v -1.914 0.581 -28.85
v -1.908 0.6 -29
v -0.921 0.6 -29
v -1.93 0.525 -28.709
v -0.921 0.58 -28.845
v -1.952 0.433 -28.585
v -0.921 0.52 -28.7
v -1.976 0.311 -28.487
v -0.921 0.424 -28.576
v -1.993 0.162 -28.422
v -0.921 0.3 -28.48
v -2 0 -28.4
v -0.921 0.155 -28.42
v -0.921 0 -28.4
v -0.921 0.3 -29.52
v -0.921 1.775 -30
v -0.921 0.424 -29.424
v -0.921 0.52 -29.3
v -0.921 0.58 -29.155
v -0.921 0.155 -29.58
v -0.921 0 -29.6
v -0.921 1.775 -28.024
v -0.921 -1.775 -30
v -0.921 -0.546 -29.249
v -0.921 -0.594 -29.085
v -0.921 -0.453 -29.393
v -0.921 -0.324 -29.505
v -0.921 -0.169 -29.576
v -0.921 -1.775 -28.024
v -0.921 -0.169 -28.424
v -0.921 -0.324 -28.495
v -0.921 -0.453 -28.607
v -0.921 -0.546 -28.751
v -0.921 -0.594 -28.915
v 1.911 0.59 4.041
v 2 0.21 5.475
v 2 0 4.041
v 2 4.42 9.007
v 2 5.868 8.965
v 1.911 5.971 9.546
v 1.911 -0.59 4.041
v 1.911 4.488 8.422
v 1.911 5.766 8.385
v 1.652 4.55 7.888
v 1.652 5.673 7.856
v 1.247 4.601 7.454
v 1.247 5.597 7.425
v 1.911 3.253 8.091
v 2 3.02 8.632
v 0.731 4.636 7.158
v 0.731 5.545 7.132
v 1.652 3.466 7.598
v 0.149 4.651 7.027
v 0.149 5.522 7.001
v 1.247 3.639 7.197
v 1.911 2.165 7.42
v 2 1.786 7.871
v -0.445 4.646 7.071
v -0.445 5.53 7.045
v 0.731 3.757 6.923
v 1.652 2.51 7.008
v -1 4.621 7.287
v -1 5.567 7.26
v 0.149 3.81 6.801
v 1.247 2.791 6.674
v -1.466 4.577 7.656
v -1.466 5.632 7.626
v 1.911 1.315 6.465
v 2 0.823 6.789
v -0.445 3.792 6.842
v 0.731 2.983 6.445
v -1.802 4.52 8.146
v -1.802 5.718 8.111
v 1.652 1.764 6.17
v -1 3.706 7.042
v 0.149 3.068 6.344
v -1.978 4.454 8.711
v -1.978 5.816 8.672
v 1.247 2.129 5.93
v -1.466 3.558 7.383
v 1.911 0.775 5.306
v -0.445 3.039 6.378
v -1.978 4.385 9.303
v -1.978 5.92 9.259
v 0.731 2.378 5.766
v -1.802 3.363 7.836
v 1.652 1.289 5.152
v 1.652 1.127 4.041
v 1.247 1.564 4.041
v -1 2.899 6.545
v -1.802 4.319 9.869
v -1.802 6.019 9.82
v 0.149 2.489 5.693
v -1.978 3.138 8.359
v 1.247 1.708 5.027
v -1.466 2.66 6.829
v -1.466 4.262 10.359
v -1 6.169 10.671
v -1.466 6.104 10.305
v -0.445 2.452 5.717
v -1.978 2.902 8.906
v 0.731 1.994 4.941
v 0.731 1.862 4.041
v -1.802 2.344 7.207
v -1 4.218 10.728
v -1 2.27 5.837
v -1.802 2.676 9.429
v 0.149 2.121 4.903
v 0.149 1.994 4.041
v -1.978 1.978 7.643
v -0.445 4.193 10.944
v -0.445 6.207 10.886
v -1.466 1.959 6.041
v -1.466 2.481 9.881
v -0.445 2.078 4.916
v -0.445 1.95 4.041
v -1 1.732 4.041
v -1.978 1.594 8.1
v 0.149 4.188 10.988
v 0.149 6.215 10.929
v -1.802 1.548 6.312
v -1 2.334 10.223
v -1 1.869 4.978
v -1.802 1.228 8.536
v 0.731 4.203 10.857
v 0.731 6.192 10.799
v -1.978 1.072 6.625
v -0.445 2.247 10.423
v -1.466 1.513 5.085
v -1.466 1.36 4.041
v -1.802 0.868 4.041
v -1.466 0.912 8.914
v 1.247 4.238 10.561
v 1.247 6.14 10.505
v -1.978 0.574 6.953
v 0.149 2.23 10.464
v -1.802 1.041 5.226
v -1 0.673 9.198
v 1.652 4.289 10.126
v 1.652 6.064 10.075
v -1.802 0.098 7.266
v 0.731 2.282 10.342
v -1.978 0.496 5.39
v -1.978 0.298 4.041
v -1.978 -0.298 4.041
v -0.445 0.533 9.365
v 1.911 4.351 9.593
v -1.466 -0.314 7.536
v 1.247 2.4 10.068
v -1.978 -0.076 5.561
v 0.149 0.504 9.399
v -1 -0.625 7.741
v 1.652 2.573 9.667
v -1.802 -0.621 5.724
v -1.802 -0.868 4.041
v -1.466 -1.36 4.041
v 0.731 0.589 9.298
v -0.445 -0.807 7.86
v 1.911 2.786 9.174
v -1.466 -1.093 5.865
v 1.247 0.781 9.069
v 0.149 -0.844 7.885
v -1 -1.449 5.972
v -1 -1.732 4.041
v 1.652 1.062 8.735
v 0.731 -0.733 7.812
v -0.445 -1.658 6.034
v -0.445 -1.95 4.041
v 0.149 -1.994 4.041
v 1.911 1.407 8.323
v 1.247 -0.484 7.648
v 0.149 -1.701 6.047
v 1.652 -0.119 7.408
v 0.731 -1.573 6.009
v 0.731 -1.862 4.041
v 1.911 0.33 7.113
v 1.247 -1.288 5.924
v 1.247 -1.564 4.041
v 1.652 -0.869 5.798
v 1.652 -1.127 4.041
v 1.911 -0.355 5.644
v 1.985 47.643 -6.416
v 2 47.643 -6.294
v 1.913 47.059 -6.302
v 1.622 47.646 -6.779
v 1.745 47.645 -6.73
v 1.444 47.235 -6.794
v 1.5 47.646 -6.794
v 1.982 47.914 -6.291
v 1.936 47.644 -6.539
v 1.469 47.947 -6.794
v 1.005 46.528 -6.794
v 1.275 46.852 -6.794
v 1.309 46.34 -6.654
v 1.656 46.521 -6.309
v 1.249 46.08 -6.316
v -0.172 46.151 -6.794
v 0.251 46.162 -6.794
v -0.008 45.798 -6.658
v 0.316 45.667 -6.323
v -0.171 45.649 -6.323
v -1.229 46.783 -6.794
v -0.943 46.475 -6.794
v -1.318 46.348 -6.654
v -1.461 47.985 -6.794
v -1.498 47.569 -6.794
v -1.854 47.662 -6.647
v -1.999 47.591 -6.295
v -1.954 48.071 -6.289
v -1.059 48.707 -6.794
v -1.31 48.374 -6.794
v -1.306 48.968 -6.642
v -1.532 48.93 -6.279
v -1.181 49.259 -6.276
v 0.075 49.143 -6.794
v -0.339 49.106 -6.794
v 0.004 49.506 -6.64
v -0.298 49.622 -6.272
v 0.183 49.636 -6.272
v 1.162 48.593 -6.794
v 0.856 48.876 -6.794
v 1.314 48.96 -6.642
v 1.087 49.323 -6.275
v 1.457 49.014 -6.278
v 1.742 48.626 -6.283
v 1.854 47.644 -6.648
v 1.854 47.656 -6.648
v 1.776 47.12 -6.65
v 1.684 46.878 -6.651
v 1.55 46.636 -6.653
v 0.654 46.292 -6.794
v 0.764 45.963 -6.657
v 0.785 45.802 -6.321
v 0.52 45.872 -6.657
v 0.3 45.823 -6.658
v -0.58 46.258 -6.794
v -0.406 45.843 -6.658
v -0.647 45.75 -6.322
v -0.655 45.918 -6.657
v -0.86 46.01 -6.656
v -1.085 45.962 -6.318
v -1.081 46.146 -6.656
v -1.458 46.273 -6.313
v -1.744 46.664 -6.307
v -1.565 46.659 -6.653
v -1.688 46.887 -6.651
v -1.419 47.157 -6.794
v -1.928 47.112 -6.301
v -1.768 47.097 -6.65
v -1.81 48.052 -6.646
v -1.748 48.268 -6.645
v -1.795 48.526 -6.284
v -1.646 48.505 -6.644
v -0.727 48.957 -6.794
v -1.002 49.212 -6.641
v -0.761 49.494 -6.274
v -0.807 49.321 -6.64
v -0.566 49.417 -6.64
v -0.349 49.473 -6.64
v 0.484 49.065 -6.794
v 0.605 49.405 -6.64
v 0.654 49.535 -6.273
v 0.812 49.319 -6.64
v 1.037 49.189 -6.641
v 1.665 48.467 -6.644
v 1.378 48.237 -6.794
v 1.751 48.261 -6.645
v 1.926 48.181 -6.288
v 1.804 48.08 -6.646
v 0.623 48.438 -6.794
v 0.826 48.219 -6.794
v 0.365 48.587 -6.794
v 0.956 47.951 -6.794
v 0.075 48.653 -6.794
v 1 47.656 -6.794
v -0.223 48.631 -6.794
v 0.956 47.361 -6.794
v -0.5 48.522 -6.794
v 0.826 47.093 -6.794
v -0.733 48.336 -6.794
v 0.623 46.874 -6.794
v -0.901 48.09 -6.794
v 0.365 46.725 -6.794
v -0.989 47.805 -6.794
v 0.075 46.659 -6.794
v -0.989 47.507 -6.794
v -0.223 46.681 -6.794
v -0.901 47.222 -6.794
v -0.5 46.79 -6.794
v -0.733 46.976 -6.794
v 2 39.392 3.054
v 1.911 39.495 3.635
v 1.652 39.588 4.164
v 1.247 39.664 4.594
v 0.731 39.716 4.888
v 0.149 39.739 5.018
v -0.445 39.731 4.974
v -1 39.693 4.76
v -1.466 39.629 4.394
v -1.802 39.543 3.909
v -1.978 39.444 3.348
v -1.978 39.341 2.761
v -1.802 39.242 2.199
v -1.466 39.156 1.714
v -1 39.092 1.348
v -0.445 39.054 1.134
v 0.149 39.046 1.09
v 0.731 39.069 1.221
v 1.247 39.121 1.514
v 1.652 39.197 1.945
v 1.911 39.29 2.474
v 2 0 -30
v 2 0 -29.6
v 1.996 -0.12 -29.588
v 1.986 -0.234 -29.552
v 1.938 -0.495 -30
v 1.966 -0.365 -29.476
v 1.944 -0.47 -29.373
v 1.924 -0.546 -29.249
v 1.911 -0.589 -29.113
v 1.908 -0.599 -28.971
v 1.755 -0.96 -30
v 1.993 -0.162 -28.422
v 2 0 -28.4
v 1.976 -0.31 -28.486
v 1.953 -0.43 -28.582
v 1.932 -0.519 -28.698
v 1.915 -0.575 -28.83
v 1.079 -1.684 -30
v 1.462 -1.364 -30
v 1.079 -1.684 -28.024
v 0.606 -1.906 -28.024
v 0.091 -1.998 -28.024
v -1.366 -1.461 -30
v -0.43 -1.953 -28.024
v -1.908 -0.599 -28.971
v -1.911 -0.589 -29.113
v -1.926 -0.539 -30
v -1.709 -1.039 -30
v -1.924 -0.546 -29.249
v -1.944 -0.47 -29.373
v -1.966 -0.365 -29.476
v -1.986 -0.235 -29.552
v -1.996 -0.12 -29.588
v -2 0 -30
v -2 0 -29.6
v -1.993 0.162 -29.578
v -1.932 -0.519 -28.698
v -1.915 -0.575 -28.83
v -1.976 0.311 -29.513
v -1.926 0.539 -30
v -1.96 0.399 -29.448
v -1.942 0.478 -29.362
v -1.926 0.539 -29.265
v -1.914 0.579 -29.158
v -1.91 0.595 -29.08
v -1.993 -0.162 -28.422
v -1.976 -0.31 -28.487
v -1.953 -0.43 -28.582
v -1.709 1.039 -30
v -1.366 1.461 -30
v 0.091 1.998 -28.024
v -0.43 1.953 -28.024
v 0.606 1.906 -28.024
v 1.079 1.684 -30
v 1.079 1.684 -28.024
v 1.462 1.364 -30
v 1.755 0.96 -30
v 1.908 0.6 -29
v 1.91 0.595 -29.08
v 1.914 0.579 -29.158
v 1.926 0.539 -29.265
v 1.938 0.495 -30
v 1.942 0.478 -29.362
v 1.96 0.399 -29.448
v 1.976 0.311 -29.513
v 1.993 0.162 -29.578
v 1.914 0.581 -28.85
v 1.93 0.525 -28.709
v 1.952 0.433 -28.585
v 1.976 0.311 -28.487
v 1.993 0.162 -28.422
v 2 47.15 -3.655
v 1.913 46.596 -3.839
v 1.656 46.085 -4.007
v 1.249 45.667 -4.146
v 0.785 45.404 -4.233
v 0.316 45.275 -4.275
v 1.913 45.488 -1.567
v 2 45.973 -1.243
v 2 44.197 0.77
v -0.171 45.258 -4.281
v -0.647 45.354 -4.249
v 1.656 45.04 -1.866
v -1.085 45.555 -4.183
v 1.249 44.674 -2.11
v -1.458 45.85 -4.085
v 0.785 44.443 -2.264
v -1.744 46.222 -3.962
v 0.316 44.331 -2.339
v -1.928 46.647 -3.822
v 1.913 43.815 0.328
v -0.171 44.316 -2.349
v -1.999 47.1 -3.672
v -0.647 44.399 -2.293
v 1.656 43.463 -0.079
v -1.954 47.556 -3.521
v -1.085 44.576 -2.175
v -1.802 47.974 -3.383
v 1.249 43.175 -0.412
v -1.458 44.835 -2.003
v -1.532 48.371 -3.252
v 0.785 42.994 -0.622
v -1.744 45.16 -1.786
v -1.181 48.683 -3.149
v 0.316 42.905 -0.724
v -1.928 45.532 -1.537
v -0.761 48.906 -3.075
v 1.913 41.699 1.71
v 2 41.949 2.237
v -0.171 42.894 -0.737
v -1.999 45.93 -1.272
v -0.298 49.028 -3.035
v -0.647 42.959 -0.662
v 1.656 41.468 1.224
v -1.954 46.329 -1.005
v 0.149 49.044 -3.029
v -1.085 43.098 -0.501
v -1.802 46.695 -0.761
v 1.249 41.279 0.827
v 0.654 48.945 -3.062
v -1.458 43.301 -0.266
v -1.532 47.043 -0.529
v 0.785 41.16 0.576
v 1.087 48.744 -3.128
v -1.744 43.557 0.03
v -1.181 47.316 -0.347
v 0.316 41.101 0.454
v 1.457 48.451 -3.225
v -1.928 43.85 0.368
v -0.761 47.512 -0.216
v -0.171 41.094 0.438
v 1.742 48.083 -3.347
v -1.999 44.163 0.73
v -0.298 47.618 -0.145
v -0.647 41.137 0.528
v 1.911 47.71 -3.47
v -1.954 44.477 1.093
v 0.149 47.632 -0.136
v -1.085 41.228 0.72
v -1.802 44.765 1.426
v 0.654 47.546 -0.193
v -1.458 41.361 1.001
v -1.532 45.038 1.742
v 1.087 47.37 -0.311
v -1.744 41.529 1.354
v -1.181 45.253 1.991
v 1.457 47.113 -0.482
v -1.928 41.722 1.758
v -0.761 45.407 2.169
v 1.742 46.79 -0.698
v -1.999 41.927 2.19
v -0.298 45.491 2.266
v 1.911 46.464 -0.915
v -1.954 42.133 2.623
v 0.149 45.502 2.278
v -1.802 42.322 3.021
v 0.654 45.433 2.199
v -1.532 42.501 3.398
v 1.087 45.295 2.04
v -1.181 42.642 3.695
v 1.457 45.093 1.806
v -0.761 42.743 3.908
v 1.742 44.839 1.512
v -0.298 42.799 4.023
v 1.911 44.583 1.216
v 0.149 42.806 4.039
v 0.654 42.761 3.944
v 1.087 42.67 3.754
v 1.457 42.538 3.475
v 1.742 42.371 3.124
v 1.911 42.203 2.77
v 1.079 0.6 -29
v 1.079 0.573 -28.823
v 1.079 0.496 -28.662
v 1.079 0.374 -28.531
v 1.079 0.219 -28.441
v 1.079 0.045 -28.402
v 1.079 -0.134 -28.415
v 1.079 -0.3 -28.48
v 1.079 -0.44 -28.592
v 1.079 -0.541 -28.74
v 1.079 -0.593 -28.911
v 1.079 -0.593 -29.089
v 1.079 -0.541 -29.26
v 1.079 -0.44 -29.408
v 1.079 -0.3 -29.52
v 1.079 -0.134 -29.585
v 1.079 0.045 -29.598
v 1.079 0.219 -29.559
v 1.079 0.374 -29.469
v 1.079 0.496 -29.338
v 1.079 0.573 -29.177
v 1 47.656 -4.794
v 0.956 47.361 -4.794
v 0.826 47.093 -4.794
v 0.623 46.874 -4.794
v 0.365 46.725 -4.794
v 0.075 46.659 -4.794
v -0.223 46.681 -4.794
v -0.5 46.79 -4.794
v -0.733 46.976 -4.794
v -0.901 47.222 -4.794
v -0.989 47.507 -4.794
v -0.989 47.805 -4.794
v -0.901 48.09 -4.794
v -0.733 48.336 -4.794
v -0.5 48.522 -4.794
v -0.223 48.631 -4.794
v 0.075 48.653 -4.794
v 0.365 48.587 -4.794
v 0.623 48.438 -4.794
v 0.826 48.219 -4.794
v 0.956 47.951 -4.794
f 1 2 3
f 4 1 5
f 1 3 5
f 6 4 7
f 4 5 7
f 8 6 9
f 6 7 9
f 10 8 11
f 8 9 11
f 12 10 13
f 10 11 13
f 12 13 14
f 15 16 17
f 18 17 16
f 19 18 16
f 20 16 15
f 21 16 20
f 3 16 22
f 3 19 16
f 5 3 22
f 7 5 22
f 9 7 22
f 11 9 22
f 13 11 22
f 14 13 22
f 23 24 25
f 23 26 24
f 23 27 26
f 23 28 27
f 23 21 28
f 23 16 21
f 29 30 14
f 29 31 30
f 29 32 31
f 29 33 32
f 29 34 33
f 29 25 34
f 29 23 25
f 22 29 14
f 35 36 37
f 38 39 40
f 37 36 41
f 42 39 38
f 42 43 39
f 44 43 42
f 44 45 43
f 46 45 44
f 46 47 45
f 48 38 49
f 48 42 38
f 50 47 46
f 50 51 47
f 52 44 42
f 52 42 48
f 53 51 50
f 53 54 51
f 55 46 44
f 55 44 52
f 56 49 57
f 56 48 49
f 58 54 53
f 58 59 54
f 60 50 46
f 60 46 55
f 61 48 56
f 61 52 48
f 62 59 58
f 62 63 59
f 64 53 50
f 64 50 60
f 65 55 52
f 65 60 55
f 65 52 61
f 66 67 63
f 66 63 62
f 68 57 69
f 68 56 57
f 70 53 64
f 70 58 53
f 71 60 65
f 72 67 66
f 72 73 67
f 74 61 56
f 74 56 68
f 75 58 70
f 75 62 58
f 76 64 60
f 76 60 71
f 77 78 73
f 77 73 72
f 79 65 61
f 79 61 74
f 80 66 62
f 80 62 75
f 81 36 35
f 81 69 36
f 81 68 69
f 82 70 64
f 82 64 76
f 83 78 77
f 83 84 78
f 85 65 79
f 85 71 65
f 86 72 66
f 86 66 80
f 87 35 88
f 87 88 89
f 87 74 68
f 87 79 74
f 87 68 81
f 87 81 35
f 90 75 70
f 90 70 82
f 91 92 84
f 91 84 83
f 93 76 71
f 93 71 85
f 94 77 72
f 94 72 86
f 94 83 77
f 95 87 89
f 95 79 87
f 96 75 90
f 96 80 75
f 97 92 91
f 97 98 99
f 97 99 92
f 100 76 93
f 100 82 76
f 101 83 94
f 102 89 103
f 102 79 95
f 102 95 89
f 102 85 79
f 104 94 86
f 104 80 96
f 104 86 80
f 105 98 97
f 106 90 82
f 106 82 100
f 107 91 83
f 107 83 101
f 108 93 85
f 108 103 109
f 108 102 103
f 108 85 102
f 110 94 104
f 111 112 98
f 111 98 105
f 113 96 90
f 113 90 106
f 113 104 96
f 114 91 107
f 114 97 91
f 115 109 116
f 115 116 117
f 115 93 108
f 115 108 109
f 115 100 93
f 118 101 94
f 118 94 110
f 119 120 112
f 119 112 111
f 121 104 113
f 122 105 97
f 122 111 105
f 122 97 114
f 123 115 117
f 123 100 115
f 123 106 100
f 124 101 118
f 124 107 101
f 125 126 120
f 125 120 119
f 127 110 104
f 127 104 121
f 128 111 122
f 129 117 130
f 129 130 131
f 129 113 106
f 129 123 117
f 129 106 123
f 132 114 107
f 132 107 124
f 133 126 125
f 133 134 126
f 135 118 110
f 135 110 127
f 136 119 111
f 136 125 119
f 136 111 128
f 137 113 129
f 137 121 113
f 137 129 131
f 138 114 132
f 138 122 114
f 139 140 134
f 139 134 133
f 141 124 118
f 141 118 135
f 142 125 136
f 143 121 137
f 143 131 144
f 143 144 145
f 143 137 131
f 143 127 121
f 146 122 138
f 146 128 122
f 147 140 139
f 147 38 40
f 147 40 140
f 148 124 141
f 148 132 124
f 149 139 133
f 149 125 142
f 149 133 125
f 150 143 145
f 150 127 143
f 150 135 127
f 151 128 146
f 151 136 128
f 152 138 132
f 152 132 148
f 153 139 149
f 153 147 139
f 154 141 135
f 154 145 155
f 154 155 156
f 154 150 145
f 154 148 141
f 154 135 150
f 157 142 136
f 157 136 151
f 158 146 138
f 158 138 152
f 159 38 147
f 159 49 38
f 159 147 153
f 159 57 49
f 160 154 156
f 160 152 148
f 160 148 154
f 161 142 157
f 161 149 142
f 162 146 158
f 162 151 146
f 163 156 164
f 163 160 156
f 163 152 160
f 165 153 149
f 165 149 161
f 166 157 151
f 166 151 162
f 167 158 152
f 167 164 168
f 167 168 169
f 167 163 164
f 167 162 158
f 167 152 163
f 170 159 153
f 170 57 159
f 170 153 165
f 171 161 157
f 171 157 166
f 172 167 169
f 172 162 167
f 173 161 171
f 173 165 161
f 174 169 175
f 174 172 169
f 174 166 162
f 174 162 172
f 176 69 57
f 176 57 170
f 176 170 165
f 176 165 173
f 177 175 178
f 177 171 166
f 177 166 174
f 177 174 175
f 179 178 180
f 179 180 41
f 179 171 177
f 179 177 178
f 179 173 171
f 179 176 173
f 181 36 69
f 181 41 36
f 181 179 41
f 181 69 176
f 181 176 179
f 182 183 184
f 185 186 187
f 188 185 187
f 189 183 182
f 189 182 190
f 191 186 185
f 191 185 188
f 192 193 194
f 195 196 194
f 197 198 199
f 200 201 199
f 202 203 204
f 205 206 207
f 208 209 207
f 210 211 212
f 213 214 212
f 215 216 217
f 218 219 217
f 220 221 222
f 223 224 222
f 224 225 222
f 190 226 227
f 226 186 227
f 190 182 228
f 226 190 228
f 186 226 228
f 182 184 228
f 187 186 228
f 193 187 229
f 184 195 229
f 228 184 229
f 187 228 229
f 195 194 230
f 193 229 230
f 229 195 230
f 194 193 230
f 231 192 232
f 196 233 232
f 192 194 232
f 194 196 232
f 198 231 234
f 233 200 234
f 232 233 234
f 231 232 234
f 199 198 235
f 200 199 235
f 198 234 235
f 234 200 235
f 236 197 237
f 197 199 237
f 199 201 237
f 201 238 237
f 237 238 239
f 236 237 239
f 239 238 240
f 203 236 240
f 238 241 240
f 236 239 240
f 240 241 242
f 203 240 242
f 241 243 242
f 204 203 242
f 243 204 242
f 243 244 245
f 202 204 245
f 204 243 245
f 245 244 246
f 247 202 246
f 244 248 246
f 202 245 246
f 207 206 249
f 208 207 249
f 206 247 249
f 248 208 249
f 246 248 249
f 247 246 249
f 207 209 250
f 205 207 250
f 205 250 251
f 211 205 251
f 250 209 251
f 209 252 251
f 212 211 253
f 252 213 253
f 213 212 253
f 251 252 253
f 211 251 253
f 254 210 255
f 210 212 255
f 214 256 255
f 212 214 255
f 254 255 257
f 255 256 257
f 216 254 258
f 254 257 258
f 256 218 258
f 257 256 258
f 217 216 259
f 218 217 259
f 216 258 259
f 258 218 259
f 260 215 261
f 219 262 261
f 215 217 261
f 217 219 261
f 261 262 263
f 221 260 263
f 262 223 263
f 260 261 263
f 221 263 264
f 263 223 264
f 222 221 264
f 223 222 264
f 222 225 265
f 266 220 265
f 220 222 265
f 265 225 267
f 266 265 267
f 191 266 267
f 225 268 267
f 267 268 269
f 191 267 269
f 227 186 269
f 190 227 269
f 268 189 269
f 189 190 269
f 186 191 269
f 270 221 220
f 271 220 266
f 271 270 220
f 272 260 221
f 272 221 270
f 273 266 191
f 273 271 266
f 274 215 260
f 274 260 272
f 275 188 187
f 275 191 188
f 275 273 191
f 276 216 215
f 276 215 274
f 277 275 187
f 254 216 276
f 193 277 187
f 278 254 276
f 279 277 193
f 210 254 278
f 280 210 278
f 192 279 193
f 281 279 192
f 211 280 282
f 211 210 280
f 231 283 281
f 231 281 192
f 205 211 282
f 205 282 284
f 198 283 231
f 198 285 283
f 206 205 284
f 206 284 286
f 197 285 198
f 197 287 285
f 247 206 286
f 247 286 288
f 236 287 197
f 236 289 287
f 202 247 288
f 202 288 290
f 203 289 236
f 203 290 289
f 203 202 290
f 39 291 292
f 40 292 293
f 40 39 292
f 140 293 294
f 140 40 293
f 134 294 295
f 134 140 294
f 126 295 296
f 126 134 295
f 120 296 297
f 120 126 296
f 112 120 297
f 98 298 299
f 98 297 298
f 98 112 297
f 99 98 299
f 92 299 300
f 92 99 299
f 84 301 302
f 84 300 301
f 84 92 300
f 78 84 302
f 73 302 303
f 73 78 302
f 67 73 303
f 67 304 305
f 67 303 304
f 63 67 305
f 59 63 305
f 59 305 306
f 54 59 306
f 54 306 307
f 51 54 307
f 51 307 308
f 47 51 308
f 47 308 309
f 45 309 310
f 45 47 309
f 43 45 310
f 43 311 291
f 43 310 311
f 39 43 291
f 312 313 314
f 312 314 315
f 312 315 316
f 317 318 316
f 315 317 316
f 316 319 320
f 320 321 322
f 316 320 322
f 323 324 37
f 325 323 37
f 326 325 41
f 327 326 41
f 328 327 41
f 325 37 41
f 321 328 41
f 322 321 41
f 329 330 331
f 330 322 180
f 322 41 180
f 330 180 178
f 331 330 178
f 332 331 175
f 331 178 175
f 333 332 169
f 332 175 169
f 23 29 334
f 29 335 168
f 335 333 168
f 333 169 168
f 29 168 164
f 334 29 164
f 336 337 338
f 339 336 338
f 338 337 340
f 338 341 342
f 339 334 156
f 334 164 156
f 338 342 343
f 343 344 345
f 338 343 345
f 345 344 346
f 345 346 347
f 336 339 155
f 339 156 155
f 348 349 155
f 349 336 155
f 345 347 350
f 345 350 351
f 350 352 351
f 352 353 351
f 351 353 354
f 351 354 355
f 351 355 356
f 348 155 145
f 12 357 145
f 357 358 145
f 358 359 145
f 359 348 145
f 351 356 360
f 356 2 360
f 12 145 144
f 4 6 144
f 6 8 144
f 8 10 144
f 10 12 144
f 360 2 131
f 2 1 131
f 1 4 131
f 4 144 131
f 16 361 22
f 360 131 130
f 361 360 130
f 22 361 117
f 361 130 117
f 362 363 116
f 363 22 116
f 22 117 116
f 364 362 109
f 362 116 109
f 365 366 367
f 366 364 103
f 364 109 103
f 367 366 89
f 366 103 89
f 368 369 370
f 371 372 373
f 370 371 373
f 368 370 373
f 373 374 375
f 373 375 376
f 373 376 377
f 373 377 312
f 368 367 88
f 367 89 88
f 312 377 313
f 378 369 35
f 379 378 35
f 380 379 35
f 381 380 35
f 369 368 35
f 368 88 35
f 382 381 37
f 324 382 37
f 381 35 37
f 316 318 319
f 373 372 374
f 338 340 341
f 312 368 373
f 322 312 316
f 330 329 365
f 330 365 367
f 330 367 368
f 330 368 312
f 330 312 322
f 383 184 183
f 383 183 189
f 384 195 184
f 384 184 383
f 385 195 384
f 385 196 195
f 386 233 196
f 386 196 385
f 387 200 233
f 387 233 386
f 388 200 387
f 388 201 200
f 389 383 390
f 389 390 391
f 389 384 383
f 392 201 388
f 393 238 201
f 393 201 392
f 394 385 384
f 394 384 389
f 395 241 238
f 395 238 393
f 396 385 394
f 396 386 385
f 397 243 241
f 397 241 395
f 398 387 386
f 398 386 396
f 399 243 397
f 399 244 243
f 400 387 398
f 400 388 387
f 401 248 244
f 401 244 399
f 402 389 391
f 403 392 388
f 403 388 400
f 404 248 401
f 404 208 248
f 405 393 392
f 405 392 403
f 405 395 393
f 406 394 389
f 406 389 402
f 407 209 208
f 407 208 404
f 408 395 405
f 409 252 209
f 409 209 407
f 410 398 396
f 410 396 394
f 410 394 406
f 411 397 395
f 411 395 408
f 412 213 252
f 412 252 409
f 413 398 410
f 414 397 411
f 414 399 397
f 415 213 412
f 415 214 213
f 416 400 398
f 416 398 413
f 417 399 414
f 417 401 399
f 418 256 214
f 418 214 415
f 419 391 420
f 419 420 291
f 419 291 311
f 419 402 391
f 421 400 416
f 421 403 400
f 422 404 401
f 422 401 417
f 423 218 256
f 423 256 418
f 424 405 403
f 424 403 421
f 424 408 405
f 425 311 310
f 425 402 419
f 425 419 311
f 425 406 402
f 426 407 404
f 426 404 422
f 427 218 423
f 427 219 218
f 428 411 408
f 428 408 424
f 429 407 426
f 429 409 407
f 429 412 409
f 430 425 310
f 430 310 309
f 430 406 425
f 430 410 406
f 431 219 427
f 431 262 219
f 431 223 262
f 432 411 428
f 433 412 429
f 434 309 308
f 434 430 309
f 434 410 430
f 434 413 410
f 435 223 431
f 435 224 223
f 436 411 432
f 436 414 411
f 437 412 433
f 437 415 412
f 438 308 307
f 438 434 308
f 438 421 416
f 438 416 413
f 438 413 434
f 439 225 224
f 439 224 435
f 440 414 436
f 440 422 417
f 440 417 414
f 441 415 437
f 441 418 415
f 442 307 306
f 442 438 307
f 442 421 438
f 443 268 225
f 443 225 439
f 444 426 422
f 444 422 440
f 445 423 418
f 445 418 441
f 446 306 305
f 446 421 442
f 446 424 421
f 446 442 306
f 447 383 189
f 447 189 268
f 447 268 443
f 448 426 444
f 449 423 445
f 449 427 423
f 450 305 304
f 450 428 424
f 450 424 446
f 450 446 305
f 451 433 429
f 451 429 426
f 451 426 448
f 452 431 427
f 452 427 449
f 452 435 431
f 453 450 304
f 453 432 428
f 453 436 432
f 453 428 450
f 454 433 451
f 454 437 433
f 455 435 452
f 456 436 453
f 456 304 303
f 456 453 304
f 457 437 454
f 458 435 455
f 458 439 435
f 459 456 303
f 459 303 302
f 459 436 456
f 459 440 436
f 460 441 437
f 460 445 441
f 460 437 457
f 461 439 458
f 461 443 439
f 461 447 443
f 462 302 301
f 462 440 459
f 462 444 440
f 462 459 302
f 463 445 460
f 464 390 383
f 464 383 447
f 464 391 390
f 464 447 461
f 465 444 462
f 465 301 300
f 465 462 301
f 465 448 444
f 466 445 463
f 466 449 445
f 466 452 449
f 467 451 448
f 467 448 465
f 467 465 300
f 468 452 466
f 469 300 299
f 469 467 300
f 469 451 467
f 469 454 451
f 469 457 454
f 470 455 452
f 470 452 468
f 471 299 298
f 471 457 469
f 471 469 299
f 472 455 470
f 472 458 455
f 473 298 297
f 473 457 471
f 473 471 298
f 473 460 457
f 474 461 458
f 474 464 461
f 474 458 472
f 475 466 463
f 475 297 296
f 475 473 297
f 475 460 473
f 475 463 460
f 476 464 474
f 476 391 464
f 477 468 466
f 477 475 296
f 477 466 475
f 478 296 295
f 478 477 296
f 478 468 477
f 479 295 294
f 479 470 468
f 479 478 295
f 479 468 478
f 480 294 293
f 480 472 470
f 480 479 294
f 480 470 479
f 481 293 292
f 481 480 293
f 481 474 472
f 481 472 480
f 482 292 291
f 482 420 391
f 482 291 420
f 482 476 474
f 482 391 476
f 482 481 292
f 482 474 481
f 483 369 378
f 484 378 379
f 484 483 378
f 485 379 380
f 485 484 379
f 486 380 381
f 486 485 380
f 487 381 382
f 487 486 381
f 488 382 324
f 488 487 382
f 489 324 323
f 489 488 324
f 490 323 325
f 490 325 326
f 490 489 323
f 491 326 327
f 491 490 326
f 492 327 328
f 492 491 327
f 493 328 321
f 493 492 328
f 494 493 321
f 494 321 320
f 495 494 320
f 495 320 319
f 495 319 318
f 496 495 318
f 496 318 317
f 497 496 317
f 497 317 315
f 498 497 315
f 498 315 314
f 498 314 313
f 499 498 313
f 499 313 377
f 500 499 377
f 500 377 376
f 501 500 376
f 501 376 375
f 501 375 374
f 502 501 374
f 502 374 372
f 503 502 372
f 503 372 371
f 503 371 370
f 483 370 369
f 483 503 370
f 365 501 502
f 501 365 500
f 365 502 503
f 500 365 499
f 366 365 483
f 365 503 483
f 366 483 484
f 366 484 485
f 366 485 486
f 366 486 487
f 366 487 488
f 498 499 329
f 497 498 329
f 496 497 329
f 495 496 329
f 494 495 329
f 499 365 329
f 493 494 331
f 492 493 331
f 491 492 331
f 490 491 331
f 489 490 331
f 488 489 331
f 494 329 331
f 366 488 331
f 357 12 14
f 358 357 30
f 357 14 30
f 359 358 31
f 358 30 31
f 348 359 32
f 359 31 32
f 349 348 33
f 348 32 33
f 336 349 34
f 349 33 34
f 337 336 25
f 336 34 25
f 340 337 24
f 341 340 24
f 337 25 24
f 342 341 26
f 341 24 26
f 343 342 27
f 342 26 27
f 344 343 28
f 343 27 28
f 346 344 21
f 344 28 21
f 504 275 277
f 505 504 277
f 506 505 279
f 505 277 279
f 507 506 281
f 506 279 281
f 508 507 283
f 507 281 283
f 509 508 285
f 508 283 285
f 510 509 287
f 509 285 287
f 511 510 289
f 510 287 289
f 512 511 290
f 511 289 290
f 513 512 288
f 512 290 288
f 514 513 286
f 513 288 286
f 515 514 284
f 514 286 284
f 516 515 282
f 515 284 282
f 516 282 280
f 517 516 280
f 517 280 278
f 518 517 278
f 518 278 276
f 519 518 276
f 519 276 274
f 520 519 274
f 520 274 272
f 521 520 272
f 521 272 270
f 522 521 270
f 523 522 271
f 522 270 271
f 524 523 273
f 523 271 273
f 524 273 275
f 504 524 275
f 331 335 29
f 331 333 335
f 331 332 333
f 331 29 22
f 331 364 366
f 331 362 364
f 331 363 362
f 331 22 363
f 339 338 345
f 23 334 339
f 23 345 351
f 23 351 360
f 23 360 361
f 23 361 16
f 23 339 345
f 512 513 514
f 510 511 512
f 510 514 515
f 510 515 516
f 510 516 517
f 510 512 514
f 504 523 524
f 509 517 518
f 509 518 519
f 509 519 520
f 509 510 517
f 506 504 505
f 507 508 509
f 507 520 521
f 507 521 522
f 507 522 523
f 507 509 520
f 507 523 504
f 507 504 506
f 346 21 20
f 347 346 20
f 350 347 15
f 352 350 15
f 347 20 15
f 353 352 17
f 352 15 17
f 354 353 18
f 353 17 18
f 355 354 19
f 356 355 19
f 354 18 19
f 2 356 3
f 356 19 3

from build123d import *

# Parameters (mm, degrees)
F0_R      = 2
F3_R      = 1
F4_DEPTH  = 2
F5_R      = 0.5
F6_R      = 2
F7_DEPTH  = 30
F8_W      = 2
F8_H      = 2
F9_DEPTH  = 50
F10_W     = 2
F10_H     = 1.97649955
F11_DEPTH = 25
F12_R     = 0.6
F13_DEPTH = 4.5506
F15_DEPTH = 10


with BuildPart() as f2:
    # F2: sweep along a path in F1
    with BuildLine(Plane.YZ) as f2_path:
        ThreePointArc((47.6558283438, -6.7940046368), (45.316272775, -0.3661285399), (39.3923101205, 3.0540728933))
        Line((39.3923101205, 3.0540728933), (5.8682408883, 8.9652708021))
        ThreePointArc((5.8682408883, 8.9652708021), (1.7860619516, 7.8714542526), (0, 4.041232037))
        Line((0, 4.041232037), (0, 0))
    # F0 (on Top) → F2 (sweep)
    with BuildSketch(Plane.XY):
        Circle(F0_R)
    sweep(path=f2_path.line)

    # F3 (on face) → F4 (cut)
    with BuildSketch(Plane(origin=(0, 0, -6.7940046368), x_dir=(1, 0, 0), z_dir=(0, 0, -1))):
        with Locations((0, -47.6558283438)):
            Circle(F3_R)
    extrude(amount=-F4_DEPTH, mode=Mode.SUBTRACT)

    # F5
    f5_edges = [f2.edges().sort_by_distance(p)[0] for p in [
        (-2, 47.655828, -6.794005),
    ]]
    fillet(f5_edges, radius=F5_R)

    # F6 (on face) → F7 (join)
    with BuildSketch(Plane(origin=(0, 0, 0), x_dir=(1, 0, 0), z_dir=(0, 0, -1))):
        Circle(F6_R)
    extrude(amount=F7_DEPTH)

    # F8 (on Front) → F9 (cut)
    with BuildSketch(Plane.XZ):
        with Locations((0.0787500758, -29.02350045)):
            Rectangle(F8_W, F8_H)
    extrude(amount=F9_DEPTH, mode=Mode.SUBTRACT)

    # F10 (on face) → F11 (cut)
    with BuildSketch(Plane.XZ):
        with Locations((0.0787500758, -29.011750225)):
            Rectangle(F10_W, F10_H)
    extrude(amount=-F11_DEPTH, mode=Mode.SUBTRACT)

    # F12 (on Right) → F13 (cut)
    with BuildSketch(Plane.YZ):
        with Locations((0, -29)):
            Circle(F12_R)
    extrude(amount=F13_DEPTH, mode=Mode.SUBTRACT)

    # F14 (on face) → F15 (cut)
    with BuildSketch(Plane.YZ.offset(-0.9212499242)):
        with BuildLine():
            ThreePointArc((0.6, -29), (0.4242640687, -28.5757359313), (0, -28.4))
            Line((0, -28.4), (0, -29.6))
            ThreePointArc((0, -29.6), (0.4242640687, -29.4242640687), (0.6, -29))
        make_face()
        with BuildLine():
            Line((0, -29.6), (0, -28.4))
            ThreePointArc((0, -28.4), (-0.6, -29), (0, -29.6))
        make_face()
    extrude(amount=-F15_DEPTH, mode=Mode.SUBTRACT)


solid = f2.part
